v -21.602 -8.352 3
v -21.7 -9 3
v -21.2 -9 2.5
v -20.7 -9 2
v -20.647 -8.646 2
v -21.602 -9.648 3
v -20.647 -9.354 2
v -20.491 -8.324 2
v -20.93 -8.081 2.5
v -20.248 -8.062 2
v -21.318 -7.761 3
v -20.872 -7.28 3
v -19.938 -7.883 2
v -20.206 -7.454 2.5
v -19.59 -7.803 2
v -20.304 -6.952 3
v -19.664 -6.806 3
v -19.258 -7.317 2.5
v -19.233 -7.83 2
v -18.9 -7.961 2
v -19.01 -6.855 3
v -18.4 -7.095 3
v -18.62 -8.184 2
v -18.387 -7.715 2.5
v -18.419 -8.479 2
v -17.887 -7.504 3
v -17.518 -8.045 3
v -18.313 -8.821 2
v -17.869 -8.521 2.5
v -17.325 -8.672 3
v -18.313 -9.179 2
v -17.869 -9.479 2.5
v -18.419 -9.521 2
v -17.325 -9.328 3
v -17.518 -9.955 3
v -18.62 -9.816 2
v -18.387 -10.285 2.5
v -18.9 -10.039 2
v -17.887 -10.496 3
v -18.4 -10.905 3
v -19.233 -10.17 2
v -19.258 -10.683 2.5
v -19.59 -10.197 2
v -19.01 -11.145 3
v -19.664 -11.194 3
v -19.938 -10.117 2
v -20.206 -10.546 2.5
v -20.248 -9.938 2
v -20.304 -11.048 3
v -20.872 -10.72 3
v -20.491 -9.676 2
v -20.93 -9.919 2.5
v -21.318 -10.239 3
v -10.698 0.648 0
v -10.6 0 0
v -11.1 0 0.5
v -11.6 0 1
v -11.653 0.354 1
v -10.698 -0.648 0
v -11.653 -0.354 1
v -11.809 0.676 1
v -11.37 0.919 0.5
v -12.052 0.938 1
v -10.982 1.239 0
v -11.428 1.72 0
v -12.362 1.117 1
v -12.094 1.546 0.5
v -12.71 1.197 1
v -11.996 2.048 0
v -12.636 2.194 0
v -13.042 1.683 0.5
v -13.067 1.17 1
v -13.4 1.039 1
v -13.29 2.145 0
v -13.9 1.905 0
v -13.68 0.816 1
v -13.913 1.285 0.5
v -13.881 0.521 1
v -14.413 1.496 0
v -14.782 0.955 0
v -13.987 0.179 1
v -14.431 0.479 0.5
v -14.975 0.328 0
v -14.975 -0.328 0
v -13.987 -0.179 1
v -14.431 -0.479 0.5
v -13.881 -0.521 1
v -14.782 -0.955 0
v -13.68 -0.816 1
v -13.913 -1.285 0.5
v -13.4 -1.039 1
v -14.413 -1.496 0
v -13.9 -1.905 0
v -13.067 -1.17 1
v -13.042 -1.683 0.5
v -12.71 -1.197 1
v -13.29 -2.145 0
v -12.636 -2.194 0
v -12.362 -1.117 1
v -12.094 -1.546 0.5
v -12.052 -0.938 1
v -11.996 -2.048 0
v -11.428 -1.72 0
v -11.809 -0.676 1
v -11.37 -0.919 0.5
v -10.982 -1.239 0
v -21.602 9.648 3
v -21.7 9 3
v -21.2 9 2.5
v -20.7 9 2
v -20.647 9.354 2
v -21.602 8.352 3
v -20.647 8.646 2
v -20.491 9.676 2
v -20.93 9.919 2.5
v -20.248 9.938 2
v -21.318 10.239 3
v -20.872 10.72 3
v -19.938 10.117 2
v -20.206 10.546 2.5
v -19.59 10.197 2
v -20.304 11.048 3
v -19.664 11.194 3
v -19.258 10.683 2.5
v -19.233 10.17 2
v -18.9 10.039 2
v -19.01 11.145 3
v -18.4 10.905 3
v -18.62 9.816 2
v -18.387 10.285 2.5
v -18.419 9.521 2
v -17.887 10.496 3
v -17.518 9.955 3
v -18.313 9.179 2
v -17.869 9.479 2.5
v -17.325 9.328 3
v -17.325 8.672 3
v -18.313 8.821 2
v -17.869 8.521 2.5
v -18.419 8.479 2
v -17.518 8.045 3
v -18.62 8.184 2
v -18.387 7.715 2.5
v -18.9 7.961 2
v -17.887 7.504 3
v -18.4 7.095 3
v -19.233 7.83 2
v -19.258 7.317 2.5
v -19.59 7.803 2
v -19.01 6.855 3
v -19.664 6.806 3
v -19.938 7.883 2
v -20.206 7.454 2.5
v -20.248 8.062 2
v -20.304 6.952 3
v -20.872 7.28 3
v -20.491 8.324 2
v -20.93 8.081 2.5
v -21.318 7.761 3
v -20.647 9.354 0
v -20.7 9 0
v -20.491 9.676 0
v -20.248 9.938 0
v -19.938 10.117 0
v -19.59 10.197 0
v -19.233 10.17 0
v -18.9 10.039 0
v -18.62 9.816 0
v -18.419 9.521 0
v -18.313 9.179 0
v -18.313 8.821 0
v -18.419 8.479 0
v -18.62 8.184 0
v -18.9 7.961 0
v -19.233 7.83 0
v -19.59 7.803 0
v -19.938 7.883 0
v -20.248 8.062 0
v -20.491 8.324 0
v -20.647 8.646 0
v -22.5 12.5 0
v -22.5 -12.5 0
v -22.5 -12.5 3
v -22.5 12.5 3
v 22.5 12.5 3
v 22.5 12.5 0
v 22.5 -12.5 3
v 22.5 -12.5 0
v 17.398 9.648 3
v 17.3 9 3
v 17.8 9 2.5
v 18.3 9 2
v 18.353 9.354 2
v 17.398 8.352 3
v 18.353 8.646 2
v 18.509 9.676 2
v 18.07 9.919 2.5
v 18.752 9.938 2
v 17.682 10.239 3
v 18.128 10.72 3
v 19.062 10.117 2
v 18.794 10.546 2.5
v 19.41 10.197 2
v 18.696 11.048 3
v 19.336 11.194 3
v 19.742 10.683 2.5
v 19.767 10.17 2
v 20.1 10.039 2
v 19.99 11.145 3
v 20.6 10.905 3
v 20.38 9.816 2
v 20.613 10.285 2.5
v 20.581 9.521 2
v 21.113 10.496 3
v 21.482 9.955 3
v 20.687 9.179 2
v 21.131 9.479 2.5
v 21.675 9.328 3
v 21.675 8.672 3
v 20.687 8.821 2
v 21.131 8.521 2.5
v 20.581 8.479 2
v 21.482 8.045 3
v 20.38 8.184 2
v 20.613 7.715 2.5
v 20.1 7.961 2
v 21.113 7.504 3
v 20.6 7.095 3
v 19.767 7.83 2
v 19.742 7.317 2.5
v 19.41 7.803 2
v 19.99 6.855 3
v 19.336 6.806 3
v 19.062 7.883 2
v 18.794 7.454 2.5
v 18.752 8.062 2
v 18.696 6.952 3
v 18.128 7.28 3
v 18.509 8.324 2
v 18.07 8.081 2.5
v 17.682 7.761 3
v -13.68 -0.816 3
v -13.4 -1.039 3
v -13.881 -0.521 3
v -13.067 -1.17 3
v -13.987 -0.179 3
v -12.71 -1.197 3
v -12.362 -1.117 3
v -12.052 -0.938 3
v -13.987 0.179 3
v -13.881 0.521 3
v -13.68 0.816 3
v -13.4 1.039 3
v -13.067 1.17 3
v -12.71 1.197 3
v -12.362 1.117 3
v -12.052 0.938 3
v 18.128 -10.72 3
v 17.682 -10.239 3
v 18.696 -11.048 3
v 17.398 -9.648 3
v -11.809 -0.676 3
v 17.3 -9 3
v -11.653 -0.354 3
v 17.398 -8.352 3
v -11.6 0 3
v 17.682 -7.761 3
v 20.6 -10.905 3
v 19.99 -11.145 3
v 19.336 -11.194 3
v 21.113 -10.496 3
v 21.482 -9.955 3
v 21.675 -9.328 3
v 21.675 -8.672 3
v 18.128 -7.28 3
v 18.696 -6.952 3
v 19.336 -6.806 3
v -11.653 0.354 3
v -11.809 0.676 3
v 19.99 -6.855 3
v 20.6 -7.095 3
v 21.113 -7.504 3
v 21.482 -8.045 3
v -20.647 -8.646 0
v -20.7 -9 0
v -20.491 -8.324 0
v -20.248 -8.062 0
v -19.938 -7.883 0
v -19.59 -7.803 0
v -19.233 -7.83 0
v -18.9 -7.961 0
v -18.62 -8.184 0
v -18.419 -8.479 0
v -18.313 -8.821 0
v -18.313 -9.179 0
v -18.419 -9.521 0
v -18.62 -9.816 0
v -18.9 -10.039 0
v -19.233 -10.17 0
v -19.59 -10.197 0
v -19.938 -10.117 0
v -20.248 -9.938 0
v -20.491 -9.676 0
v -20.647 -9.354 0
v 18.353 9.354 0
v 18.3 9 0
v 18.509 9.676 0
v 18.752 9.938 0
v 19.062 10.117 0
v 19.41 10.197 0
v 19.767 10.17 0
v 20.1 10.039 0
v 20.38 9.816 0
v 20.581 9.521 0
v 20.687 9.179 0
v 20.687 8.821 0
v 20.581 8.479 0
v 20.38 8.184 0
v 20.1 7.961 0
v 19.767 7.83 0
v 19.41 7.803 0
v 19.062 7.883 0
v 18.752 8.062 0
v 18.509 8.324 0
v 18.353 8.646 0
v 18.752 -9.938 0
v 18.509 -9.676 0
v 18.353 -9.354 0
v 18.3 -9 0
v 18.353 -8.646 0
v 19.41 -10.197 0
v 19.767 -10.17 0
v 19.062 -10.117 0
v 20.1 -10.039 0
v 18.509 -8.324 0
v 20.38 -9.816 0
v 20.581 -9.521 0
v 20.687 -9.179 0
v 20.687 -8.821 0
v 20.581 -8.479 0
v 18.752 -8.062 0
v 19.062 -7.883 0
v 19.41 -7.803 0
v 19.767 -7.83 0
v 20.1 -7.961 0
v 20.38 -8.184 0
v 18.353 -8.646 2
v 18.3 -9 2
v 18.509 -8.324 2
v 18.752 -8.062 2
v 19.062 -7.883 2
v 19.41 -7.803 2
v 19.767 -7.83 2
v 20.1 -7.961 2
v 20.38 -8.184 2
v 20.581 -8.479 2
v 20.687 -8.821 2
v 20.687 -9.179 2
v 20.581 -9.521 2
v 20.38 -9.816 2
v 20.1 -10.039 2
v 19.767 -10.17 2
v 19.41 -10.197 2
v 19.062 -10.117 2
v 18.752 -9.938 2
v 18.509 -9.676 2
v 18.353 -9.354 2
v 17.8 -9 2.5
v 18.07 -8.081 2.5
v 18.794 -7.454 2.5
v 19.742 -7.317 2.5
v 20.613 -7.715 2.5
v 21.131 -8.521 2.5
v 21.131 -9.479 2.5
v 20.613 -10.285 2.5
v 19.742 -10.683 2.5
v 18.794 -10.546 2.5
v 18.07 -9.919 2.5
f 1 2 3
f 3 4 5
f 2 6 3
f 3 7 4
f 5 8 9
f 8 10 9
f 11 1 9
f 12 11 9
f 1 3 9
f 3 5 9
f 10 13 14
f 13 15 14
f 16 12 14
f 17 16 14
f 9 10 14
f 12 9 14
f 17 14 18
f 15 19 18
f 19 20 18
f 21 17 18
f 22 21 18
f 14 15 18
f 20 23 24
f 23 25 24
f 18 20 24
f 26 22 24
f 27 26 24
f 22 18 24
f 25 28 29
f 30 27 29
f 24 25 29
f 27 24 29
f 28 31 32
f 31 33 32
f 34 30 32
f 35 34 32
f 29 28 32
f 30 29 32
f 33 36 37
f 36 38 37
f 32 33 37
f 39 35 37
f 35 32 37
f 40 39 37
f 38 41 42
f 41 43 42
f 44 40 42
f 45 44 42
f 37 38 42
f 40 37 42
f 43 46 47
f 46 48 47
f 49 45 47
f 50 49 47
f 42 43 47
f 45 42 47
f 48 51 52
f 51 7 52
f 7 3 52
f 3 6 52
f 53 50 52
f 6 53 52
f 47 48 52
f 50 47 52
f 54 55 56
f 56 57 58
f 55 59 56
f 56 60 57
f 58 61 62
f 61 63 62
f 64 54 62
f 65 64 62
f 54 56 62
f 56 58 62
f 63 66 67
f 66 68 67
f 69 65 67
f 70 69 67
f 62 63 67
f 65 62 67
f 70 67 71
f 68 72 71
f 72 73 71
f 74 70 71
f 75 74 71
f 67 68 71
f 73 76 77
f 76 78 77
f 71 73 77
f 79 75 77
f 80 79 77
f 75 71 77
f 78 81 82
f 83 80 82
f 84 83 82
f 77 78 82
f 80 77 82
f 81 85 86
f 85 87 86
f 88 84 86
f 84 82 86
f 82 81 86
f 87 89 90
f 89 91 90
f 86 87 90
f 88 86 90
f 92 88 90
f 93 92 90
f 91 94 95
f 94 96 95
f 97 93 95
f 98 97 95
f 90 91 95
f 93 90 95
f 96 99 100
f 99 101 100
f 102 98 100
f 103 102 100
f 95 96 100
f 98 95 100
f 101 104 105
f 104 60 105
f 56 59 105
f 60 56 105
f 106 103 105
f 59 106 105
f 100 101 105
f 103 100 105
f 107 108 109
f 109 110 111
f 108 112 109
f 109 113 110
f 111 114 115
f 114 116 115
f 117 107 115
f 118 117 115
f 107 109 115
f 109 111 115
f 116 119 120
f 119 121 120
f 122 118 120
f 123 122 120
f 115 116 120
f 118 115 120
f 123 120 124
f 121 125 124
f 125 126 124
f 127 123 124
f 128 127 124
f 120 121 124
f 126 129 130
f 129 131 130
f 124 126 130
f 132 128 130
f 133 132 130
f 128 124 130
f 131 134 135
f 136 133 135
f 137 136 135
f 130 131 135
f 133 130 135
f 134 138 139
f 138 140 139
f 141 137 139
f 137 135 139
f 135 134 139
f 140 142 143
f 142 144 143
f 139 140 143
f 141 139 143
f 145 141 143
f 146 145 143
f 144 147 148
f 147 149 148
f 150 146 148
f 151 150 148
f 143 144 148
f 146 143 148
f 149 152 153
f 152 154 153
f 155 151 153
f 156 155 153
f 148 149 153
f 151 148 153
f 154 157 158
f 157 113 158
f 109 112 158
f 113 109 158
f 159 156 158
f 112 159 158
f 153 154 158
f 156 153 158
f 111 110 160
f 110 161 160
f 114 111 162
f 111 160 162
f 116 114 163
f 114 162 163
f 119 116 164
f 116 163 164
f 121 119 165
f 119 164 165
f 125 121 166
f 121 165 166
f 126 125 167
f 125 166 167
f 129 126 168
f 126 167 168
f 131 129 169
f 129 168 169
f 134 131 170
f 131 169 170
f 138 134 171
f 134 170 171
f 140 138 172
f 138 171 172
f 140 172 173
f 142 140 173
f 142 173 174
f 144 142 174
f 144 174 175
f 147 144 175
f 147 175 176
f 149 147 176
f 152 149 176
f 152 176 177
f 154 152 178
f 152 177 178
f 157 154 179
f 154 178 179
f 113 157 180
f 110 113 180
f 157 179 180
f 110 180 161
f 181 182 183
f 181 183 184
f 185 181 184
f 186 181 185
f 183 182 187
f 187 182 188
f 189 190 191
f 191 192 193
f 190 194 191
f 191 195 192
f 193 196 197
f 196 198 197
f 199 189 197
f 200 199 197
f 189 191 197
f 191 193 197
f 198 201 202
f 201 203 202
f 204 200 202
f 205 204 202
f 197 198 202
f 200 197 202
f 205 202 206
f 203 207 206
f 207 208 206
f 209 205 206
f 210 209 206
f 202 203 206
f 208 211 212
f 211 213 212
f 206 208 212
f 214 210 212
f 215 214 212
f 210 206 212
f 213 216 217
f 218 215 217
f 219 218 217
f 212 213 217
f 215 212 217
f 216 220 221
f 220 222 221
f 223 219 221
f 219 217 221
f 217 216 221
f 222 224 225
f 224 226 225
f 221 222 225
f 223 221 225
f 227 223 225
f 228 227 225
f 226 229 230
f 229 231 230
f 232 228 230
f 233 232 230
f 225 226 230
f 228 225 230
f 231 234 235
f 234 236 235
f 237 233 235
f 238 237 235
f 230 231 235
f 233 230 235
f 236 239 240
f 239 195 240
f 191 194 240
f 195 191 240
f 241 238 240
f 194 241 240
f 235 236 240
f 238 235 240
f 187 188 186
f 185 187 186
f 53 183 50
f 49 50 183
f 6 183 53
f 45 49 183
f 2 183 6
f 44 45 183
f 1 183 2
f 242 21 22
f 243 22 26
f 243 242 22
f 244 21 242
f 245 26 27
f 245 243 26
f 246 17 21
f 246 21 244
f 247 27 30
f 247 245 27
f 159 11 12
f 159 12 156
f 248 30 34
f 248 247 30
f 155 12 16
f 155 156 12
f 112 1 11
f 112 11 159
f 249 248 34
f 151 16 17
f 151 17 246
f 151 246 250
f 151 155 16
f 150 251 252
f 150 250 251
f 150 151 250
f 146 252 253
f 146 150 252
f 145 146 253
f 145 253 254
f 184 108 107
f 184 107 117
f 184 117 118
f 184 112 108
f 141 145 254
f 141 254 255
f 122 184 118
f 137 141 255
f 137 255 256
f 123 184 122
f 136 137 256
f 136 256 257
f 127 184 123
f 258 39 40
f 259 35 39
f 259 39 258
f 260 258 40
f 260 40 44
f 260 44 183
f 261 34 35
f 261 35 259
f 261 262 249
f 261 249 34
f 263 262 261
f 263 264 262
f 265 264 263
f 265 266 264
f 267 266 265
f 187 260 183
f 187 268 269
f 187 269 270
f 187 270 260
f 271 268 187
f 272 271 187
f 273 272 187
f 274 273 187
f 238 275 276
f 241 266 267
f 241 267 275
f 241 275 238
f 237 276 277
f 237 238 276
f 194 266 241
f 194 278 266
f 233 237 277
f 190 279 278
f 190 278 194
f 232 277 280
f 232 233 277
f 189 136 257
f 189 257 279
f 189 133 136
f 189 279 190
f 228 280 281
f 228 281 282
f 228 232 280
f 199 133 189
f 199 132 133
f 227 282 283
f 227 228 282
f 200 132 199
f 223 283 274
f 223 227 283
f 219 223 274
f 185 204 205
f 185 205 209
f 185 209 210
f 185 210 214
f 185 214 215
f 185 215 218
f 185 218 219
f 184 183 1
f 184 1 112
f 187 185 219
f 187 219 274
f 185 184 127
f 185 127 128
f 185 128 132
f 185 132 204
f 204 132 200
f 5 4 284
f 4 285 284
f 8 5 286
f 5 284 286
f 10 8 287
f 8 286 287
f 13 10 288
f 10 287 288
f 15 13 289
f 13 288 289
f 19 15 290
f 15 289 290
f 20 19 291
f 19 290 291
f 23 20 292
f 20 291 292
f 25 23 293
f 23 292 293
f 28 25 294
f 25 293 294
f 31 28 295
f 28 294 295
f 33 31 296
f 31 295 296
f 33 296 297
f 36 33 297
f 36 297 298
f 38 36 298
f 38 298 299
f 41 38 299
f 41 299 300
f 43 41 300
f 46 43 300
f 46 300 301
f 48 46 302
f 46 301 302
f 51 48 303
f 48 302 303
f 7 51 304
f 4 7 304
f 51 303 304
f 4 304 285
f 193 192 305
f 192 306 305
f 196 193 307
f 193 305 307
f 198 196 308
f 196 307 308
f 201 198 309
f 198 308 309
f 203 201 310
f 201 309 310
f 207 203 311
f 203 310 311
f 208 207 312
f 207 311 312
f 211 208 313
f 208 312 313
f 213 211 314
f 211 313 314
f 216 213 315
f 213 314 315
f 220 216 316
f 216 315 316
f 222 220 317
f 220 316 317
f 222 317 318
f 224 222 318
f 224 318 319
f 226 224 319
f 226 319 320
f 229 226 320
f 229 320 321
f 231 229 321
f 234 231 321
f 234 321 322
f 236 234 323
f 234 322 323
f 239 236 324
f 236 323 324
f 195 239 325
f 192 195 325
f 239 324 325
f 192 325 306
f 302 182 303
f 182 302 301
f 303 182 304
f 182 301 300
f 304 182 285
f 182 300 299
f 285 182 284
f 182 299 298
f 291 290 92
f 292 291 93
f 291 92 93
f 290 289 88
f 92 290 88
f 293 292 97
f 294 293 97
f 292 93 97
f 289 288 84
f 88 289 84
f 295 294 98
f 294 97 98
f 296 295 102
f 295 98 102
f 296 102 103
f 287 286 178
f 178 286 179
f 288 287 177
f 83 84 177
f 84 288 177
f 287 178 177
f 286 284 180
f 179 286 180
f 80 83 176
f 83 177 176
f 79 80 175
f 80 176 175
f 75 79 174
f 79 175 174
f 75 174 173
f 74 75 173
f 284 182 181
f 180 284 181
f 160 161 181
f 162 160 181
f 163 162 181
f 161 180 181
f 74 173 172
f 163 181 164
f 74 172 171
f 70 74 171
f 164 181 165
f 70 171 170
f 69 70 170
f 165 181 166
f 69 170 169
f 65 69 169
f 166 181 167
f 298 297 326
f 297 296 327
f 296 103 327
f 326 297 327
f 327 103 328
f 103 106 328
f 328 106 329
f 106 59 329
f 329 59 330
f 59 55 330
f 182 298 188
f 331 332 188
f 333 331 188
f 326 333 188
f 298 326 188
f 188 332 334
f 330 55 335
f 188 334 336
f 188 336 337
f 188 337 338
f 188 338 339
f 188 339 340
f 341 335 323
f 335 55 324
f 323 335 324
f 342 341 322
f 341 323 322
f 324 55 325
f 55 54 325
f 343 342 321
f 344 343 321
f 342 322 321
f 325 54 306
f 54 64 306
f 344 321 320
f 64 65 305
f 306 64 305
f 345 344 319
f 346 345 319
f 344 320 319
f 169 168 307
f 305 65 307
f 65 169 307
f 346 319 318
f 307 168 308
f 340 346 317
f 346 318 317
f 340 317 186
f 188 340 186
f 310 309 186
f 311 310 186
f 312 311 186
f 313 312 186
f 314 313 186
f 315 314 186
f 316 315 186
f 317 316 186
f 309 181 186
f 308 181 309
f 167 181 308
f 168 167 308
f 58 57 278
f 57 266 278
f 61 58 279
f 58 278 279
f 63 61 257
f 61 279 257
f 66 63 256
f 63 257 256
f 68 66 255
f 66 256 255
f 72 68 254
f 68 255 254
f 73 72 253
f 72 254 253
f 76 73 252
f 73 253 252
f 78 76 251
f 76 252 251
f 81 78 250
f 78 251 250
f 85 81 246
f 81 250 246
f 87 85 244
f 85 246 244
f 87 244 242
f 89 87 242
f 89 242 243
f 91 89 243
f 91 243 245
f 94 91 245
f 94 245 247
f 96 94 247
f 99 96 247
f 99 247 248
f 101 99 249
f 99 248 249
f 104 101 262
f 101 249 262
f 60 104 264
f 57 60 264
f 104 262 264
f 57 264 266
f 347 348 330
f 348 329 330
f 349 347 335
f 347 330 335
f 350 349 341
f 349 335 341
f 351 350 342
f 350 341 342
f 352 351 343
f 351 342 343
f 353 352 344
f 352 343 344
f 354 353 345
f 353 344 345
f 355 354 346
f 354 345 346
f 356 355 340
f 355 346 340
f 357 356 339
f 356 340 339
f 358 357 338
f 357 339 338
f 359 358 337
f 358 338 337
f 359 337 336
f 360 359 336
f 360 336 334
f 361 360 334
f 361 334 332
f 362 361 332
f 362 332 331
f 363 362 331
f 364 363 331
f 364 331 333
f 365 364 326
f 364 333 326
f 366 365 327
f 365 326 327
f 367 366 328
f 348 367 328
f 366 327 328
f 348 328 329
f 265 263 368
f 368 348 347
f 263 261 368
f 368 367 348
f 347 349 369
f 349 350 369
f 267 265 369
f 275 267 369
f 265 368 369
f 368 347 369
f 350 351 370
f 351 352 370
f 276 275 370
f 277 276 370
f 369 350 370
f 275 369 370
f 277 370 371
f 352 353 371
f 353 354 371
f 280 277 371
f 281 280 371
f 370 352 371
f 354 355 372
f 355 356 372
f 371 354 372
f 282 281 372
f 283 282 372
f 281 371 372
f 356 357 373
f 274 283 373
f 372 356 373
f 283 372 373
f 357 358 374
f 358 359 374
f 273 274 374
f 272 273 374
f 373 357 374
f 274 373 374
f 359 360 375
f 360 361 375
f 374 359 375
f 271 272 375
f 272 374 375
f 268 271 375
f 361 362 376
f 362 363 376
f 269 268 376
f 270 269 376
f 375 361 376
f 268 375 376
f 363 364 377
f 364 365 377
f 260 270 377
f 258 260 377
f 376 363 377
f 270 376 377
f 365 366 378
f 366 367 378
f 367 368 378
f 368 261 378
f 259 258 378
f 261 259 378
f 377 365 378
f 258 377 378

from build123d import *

# Parameters (mm, degrees)
SKETCH1_W                                       = 45
SKETCH1_H                                       = 25
BOSS_EXTRUDE1_DEPTH                             = 3
CSK_FOR_M2_FLAT_HEAD_MACHINE_SCREW1_D           = 2.4
CSK_FOR_M2_FLAT_HEAD_MACHINE_SCREW1_CSINK_D     = 4.4
CSK_FOR_M2_FLAT_HEAD_MACHINE_SCREW1_CSINK_ANGLE = 90
CSK_FOR_M2_FLAT_HEAD_MACHINE_SCREW2_D           = 2.4
CSK_FOR_M2_FLAT_HEAD_MACHINE_SCREW2_CSINK_D     = 4.4
CSK_FOR_M2_FLAT_HEAD_MACHINE_SCREW2_CSINK_ANGLE = 90


with BuildPart() as part:
    # Sketch1 → Boss-Extrude1 (new body)
    with BuildSketch(Plane.XY):
        Rectangle(SKETCH1_W, SKETCH1_H)
    extrude(amount=BOSS_EXTRUDE1_DEPTH)

    # CSK for M2 Flat Head Machine Screw1 (through all)
    with Locations(Plane.XY.offset(3)):
        with Locations((-19.5, 9), (19.5, 9), (19.5, -9), (-19.5, -9)):
            CounterSinkHole(CSK_FOR_M2_FLAT_HEAD_MACHINE_SCREW1_D / 2, CSK_FOR_M2_FLAT_HEAD_MACHINE_SCREW1_CSINK_D / 2, counter_sink_angle=CSK_FOR_M2_FLAT_HEAD_MACHINE_SCREW1_CSINK_ANGLE)

    # CSK for M2 Flat Head Machine Screw2 (through all)
    with Locations(Plane(origin=(0, 0, 0), x_dir=(-1, 0, 0), z_dir=(0, 0, -1))):
        with Locations((12.8, 0)):
            CounterSinkHole(CSK_FOR_M2_FLAT_HEAD_MACHINE_SCREW2_D / 2, CSK_FOR_M2_FLAT_HEAD_MACHINE_SCREW2_CSINK_D / 2, counter_sink_angle=CSK_FOR_M2_FLAT_HEAD_MACHINE_SCREW2_CSINK_ANGLE)


solid = part.part
